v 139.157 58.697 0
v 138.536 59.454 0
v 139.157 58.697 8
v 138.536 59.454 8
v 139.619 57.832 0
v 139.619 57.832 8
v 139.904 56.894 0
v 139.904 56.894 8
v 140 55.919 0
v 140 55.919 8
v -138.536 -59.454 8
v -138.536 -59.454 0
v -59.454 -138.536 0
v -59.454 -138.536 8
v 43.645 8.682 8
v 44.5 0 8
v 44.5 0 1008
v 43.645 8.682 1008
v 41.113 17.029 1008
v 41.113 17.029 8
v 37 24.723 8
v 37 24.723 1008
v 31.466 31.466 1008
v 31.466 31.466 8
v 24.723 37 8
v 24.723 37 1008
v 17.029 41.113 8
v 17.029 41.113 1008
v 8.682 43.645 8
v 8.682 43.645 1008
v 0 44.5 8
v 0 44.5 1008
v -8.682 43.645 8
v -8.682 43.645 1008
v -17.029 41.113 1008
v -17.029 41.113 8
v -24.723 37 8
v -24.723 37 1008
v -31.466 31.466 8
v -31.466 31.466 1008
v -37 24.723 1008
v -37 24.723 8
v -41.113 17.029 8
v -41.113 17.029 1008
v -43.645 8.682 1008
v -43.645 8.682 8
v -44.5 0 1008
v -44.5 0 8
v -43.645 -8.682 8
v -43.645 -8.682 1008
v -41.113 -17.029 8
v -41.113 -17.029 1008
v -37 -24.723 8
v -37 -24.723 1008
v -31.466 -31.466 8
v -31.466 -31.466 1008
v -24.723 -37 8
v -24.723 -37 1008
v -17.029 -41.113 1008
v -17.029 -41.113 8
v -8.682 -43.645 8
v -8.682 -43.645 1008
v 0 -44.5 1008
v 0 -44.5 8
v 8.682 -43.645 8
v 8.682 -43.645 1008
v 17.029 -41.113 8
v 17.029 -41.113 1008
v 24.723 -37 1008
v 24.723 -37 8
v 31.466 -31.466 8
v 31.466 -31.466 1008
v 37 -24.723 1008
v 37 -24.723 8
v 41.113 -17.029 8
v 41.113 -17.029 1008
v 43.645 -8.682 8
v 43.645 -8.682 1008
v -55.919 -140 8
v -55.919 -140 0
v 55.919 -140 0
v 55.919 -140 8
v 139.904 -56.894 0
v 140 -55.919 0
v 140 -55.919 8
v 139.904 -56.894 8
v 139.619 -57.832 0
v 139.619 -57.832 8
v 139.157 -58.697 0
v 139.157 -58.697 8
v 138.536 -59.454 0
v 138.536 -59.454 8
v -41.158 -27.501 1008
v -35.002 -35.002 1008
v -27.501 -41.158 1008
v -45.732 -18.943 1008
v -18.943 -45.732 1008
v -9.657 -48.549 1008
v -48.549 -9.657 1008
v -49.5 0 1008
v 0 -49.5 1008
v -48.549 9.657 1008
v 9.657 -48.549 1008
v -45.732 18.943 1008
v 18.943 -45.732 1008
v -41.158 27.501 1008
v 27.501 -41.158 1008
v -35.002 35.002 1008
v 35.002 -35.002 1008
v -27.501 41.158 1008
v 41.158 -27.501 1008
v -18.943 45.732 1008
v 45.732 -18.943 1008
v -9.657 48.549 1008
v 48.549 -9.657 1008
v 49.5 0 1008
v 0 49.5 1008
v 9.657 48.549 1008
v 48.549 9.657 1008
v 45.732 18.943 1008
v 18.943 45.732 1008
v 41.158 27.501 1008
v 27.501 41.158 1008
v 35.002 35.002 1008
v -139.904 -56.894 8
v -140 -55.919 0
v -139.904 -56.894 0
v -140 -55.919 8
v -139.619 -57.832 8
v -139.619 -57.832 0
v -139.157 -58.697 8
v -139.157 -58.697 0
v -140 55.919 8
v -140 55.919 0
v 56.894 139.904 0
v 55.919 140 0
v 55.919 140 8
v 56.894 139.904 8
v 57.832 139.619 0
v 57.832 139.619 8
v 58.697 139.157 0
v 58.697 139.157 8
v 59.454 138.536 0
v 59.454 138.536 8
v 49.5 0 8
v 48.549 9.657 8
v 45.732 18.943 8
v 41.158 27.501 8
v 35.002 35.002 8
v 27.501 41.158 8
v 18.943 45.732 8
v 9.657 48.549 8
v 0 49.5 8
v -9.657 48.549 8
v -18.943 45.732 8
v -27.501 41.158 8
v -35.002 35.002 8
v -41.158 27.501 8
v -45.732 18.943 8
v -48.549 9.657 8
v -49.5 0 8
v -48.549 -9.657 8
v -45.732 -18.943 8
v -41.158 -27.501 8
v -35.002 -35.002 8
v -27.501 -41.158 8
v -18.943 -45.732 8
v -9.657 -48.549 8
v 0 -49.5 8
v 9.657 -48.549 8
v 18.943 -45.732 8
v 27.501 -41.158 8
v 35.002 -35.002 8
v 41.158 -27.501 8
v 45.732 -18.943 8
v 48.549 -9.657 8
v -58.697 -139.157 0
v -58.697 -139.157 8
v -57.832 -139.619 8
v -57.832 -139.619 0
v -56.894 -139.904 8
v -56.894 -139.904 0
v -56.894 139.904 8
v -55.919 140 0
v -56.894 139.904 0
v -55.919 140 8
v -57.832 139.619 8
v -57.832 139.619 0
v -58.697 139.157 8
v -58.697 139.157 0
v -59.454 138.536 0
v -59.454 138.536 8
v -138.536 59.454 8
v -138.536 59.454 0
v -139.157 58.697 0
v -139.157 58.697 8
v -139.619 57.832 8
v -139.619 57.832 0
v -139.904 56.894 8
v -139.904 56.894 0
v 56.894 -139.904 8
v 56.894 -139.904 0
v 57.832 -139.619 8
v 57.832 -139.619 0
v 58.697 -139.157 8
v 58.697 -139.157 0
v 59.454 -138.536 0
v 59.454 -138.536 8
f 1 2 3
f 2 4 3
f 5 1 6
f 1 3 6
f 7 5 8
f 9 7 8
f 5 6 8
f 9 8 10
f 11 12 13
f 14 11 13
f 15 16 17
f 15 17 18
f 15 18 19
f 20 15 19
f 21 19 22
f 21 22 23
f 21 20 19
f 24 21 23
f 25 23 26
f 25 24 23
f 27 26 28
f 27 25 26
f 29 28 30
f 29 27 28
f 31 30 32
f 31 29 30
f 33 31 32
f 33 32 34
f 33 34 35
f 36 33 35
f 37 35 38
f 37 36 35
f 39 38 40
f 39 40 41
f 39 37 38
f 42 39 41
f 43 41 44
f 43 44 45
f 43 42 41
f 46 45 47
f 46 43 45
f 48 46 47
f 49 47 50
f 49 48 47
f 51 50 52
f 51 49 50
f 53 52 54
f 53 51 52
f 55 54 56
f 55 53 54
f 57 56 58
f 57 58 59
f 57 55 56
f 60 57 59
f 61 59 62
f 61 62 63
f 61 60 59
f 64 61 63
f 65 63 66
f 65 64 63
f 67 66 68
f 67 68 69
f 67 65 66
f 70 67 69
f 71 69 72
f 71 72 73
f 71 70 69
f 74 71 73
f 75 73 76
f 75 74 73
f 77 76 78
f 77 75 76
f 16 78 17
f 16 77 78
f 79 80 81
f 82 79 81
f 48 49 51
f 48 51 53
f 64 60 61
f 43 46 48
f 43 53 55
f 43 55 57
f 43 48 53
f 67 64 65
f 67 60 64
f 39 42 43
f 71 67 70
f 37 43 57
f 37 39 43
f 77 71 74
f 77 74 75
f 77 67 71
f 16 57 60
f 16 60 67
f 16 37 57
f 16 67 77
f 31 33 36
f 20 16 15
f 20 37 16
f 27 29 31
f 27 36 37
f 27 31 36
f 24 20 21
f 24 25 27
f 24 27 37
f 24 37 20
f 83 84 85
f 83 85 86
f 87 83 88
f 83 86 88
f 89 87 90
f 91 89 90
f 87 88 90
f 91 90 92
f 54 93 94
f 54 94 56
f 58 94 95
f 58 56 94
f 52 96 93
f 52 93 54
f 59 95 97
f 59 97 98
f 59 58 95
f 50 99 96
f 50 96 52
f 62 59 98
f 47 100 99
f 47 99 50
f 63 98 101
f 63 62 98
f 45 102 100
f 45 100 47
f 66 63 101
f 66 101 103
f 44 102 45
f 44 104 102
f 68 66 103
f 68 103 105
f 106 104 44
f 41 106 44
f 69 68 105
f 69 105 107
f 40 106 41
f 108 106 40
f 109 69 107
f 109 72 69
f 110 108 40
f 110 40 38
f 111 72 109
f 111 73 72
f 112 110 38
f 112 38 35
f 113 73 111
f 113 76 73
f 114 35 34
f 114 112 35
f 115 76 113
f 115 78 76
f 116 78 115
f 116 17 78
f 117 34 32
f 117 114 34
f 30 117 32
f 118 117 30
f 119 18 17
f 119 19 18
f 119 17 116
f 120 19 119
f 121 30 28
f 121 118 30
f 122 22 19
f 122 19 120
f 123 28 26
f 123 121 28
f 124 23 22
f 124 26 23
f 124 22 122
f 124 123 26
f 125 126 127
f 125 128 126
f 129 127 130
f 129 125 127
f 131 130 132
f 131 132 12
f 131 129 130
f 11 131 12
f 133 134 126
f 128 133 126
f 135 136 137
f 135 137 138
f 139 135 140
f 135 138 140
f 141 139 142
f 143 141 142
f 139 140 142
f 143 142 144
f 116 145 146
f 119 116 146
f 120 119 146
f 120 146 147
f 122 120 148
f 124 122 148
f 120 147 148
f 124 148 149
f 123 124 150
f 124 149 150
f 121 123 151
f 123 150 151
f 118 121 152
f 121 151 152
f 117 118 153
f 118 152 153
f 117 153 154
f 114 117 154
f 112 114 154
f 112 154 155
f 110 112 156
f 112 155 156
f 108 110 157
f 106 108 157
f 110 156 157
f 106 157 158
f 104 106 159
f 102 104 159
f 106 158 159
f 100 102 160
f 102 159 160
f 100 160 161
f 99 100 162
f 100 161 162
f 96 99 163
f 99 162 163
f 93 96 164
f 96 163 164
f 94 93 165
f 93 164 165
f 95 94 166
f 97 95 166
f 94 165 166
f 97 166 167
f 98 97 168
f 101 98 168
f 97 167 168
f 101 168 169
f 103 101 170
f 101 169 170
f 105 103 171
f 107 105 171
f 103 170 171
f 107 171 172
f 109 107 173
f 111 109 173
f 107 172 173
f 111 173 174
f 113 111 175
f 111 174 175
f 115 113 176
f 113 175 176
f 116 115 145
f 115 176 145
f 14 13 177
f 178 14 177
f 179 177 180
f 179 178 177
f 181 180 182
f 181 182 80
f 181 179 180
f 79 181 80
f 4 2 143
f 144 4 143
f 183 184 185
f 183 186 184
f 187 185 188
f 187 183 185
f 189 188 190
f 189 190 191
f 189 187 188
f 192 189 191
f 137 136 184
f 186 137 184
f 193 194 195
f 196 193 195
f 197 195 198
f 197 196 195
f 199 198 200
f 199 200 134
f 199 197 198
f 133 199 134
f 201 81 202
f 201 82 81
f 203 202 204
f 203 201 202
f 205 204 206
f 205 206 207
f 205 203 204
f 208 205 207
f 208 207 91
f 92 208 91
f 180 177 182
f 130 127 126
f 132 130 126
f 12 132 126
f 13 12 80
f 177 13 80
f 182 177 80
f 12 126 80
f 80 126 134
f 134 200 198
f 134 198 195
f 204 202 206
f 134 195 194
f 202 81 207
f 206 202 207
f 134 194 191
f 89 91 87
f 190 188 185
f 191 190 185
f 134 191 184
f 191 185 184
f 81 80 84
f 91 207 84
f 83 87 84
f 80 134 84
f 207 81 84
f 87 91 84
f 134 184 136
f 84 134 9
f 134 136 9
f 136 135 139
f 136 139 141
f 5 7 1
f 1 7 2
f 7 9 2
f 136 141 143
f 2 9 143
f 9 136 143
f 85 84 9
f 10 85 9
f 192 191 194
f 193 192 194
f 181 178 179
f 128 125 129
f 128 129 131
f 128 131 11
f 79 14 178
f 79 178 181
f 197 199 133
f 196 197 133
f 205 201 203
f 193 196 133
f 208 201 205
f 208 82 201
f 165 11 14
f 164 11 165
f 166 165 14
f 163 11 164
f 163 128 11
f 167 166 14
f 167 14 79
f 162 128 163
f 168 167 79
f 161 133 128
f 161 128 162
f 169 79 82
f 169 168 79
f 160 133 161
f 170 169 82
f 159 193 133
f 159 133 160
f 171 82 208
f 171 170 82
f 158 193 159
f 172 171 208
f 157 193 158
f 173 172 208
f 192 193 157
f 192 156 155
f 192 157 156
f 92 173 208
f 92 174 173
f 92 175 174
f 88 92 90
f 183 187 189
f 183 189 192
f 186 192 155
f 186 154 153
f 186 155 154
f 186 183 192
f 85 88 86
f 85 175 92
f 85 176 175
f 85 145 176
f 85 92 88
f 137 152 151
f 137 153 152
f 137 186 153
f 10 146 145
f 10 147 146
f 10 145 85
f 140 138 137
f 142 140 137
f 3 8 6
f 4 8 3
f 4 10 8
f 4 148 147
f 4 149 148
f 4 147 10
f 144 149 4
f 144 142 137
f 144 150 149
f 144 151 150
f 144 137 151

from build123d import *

# Parameters (mm, degrees)
F1_DEPTH = 8
F2_R     = 49.5
F2_R_2   = 44.500001
F3_DEPTH = 1000
F4_R     = 5


with BuildPart() as f1:
    # F0 (on Top) → F1 (new body)
    with BuildSketch(Plane.XY):
        Polygon((57.989899, 140), (-57.989899, 140), (-140, 57.989899), (-140, -57.989899), (-57.989899, -140), (57.989899, -140), (140, -57.989899), (140, 57.989899), align=None)
    extrude(amount=F1_DEPTH)

    # F2 (on face) → F3 (join)
    with BuildSketch(Plane.XY.offset(8)):
        Circle(F2_R)
        Circle(F2_R_2, mode=Mode.SUBTRACT)
    extrude(amount=F3_DEPTH)

    # F4
    f4_edges = [f1.edges().sort_by_distance(p)[0] for p in [
        (57.989899, 140, 4),
        (-57.989899, 140, 4),
        (-140, 57.989899, 4),
        (-140, -57.989899, 4),
        (-57.989899, -140, 4),
        (57.989899, -140, 4),
        (140, -57.989899, 4),
        (140, 57.989899, 4),
    ]]
    fillet(f4_edges, radius=F4_R)


solid = f1.part
